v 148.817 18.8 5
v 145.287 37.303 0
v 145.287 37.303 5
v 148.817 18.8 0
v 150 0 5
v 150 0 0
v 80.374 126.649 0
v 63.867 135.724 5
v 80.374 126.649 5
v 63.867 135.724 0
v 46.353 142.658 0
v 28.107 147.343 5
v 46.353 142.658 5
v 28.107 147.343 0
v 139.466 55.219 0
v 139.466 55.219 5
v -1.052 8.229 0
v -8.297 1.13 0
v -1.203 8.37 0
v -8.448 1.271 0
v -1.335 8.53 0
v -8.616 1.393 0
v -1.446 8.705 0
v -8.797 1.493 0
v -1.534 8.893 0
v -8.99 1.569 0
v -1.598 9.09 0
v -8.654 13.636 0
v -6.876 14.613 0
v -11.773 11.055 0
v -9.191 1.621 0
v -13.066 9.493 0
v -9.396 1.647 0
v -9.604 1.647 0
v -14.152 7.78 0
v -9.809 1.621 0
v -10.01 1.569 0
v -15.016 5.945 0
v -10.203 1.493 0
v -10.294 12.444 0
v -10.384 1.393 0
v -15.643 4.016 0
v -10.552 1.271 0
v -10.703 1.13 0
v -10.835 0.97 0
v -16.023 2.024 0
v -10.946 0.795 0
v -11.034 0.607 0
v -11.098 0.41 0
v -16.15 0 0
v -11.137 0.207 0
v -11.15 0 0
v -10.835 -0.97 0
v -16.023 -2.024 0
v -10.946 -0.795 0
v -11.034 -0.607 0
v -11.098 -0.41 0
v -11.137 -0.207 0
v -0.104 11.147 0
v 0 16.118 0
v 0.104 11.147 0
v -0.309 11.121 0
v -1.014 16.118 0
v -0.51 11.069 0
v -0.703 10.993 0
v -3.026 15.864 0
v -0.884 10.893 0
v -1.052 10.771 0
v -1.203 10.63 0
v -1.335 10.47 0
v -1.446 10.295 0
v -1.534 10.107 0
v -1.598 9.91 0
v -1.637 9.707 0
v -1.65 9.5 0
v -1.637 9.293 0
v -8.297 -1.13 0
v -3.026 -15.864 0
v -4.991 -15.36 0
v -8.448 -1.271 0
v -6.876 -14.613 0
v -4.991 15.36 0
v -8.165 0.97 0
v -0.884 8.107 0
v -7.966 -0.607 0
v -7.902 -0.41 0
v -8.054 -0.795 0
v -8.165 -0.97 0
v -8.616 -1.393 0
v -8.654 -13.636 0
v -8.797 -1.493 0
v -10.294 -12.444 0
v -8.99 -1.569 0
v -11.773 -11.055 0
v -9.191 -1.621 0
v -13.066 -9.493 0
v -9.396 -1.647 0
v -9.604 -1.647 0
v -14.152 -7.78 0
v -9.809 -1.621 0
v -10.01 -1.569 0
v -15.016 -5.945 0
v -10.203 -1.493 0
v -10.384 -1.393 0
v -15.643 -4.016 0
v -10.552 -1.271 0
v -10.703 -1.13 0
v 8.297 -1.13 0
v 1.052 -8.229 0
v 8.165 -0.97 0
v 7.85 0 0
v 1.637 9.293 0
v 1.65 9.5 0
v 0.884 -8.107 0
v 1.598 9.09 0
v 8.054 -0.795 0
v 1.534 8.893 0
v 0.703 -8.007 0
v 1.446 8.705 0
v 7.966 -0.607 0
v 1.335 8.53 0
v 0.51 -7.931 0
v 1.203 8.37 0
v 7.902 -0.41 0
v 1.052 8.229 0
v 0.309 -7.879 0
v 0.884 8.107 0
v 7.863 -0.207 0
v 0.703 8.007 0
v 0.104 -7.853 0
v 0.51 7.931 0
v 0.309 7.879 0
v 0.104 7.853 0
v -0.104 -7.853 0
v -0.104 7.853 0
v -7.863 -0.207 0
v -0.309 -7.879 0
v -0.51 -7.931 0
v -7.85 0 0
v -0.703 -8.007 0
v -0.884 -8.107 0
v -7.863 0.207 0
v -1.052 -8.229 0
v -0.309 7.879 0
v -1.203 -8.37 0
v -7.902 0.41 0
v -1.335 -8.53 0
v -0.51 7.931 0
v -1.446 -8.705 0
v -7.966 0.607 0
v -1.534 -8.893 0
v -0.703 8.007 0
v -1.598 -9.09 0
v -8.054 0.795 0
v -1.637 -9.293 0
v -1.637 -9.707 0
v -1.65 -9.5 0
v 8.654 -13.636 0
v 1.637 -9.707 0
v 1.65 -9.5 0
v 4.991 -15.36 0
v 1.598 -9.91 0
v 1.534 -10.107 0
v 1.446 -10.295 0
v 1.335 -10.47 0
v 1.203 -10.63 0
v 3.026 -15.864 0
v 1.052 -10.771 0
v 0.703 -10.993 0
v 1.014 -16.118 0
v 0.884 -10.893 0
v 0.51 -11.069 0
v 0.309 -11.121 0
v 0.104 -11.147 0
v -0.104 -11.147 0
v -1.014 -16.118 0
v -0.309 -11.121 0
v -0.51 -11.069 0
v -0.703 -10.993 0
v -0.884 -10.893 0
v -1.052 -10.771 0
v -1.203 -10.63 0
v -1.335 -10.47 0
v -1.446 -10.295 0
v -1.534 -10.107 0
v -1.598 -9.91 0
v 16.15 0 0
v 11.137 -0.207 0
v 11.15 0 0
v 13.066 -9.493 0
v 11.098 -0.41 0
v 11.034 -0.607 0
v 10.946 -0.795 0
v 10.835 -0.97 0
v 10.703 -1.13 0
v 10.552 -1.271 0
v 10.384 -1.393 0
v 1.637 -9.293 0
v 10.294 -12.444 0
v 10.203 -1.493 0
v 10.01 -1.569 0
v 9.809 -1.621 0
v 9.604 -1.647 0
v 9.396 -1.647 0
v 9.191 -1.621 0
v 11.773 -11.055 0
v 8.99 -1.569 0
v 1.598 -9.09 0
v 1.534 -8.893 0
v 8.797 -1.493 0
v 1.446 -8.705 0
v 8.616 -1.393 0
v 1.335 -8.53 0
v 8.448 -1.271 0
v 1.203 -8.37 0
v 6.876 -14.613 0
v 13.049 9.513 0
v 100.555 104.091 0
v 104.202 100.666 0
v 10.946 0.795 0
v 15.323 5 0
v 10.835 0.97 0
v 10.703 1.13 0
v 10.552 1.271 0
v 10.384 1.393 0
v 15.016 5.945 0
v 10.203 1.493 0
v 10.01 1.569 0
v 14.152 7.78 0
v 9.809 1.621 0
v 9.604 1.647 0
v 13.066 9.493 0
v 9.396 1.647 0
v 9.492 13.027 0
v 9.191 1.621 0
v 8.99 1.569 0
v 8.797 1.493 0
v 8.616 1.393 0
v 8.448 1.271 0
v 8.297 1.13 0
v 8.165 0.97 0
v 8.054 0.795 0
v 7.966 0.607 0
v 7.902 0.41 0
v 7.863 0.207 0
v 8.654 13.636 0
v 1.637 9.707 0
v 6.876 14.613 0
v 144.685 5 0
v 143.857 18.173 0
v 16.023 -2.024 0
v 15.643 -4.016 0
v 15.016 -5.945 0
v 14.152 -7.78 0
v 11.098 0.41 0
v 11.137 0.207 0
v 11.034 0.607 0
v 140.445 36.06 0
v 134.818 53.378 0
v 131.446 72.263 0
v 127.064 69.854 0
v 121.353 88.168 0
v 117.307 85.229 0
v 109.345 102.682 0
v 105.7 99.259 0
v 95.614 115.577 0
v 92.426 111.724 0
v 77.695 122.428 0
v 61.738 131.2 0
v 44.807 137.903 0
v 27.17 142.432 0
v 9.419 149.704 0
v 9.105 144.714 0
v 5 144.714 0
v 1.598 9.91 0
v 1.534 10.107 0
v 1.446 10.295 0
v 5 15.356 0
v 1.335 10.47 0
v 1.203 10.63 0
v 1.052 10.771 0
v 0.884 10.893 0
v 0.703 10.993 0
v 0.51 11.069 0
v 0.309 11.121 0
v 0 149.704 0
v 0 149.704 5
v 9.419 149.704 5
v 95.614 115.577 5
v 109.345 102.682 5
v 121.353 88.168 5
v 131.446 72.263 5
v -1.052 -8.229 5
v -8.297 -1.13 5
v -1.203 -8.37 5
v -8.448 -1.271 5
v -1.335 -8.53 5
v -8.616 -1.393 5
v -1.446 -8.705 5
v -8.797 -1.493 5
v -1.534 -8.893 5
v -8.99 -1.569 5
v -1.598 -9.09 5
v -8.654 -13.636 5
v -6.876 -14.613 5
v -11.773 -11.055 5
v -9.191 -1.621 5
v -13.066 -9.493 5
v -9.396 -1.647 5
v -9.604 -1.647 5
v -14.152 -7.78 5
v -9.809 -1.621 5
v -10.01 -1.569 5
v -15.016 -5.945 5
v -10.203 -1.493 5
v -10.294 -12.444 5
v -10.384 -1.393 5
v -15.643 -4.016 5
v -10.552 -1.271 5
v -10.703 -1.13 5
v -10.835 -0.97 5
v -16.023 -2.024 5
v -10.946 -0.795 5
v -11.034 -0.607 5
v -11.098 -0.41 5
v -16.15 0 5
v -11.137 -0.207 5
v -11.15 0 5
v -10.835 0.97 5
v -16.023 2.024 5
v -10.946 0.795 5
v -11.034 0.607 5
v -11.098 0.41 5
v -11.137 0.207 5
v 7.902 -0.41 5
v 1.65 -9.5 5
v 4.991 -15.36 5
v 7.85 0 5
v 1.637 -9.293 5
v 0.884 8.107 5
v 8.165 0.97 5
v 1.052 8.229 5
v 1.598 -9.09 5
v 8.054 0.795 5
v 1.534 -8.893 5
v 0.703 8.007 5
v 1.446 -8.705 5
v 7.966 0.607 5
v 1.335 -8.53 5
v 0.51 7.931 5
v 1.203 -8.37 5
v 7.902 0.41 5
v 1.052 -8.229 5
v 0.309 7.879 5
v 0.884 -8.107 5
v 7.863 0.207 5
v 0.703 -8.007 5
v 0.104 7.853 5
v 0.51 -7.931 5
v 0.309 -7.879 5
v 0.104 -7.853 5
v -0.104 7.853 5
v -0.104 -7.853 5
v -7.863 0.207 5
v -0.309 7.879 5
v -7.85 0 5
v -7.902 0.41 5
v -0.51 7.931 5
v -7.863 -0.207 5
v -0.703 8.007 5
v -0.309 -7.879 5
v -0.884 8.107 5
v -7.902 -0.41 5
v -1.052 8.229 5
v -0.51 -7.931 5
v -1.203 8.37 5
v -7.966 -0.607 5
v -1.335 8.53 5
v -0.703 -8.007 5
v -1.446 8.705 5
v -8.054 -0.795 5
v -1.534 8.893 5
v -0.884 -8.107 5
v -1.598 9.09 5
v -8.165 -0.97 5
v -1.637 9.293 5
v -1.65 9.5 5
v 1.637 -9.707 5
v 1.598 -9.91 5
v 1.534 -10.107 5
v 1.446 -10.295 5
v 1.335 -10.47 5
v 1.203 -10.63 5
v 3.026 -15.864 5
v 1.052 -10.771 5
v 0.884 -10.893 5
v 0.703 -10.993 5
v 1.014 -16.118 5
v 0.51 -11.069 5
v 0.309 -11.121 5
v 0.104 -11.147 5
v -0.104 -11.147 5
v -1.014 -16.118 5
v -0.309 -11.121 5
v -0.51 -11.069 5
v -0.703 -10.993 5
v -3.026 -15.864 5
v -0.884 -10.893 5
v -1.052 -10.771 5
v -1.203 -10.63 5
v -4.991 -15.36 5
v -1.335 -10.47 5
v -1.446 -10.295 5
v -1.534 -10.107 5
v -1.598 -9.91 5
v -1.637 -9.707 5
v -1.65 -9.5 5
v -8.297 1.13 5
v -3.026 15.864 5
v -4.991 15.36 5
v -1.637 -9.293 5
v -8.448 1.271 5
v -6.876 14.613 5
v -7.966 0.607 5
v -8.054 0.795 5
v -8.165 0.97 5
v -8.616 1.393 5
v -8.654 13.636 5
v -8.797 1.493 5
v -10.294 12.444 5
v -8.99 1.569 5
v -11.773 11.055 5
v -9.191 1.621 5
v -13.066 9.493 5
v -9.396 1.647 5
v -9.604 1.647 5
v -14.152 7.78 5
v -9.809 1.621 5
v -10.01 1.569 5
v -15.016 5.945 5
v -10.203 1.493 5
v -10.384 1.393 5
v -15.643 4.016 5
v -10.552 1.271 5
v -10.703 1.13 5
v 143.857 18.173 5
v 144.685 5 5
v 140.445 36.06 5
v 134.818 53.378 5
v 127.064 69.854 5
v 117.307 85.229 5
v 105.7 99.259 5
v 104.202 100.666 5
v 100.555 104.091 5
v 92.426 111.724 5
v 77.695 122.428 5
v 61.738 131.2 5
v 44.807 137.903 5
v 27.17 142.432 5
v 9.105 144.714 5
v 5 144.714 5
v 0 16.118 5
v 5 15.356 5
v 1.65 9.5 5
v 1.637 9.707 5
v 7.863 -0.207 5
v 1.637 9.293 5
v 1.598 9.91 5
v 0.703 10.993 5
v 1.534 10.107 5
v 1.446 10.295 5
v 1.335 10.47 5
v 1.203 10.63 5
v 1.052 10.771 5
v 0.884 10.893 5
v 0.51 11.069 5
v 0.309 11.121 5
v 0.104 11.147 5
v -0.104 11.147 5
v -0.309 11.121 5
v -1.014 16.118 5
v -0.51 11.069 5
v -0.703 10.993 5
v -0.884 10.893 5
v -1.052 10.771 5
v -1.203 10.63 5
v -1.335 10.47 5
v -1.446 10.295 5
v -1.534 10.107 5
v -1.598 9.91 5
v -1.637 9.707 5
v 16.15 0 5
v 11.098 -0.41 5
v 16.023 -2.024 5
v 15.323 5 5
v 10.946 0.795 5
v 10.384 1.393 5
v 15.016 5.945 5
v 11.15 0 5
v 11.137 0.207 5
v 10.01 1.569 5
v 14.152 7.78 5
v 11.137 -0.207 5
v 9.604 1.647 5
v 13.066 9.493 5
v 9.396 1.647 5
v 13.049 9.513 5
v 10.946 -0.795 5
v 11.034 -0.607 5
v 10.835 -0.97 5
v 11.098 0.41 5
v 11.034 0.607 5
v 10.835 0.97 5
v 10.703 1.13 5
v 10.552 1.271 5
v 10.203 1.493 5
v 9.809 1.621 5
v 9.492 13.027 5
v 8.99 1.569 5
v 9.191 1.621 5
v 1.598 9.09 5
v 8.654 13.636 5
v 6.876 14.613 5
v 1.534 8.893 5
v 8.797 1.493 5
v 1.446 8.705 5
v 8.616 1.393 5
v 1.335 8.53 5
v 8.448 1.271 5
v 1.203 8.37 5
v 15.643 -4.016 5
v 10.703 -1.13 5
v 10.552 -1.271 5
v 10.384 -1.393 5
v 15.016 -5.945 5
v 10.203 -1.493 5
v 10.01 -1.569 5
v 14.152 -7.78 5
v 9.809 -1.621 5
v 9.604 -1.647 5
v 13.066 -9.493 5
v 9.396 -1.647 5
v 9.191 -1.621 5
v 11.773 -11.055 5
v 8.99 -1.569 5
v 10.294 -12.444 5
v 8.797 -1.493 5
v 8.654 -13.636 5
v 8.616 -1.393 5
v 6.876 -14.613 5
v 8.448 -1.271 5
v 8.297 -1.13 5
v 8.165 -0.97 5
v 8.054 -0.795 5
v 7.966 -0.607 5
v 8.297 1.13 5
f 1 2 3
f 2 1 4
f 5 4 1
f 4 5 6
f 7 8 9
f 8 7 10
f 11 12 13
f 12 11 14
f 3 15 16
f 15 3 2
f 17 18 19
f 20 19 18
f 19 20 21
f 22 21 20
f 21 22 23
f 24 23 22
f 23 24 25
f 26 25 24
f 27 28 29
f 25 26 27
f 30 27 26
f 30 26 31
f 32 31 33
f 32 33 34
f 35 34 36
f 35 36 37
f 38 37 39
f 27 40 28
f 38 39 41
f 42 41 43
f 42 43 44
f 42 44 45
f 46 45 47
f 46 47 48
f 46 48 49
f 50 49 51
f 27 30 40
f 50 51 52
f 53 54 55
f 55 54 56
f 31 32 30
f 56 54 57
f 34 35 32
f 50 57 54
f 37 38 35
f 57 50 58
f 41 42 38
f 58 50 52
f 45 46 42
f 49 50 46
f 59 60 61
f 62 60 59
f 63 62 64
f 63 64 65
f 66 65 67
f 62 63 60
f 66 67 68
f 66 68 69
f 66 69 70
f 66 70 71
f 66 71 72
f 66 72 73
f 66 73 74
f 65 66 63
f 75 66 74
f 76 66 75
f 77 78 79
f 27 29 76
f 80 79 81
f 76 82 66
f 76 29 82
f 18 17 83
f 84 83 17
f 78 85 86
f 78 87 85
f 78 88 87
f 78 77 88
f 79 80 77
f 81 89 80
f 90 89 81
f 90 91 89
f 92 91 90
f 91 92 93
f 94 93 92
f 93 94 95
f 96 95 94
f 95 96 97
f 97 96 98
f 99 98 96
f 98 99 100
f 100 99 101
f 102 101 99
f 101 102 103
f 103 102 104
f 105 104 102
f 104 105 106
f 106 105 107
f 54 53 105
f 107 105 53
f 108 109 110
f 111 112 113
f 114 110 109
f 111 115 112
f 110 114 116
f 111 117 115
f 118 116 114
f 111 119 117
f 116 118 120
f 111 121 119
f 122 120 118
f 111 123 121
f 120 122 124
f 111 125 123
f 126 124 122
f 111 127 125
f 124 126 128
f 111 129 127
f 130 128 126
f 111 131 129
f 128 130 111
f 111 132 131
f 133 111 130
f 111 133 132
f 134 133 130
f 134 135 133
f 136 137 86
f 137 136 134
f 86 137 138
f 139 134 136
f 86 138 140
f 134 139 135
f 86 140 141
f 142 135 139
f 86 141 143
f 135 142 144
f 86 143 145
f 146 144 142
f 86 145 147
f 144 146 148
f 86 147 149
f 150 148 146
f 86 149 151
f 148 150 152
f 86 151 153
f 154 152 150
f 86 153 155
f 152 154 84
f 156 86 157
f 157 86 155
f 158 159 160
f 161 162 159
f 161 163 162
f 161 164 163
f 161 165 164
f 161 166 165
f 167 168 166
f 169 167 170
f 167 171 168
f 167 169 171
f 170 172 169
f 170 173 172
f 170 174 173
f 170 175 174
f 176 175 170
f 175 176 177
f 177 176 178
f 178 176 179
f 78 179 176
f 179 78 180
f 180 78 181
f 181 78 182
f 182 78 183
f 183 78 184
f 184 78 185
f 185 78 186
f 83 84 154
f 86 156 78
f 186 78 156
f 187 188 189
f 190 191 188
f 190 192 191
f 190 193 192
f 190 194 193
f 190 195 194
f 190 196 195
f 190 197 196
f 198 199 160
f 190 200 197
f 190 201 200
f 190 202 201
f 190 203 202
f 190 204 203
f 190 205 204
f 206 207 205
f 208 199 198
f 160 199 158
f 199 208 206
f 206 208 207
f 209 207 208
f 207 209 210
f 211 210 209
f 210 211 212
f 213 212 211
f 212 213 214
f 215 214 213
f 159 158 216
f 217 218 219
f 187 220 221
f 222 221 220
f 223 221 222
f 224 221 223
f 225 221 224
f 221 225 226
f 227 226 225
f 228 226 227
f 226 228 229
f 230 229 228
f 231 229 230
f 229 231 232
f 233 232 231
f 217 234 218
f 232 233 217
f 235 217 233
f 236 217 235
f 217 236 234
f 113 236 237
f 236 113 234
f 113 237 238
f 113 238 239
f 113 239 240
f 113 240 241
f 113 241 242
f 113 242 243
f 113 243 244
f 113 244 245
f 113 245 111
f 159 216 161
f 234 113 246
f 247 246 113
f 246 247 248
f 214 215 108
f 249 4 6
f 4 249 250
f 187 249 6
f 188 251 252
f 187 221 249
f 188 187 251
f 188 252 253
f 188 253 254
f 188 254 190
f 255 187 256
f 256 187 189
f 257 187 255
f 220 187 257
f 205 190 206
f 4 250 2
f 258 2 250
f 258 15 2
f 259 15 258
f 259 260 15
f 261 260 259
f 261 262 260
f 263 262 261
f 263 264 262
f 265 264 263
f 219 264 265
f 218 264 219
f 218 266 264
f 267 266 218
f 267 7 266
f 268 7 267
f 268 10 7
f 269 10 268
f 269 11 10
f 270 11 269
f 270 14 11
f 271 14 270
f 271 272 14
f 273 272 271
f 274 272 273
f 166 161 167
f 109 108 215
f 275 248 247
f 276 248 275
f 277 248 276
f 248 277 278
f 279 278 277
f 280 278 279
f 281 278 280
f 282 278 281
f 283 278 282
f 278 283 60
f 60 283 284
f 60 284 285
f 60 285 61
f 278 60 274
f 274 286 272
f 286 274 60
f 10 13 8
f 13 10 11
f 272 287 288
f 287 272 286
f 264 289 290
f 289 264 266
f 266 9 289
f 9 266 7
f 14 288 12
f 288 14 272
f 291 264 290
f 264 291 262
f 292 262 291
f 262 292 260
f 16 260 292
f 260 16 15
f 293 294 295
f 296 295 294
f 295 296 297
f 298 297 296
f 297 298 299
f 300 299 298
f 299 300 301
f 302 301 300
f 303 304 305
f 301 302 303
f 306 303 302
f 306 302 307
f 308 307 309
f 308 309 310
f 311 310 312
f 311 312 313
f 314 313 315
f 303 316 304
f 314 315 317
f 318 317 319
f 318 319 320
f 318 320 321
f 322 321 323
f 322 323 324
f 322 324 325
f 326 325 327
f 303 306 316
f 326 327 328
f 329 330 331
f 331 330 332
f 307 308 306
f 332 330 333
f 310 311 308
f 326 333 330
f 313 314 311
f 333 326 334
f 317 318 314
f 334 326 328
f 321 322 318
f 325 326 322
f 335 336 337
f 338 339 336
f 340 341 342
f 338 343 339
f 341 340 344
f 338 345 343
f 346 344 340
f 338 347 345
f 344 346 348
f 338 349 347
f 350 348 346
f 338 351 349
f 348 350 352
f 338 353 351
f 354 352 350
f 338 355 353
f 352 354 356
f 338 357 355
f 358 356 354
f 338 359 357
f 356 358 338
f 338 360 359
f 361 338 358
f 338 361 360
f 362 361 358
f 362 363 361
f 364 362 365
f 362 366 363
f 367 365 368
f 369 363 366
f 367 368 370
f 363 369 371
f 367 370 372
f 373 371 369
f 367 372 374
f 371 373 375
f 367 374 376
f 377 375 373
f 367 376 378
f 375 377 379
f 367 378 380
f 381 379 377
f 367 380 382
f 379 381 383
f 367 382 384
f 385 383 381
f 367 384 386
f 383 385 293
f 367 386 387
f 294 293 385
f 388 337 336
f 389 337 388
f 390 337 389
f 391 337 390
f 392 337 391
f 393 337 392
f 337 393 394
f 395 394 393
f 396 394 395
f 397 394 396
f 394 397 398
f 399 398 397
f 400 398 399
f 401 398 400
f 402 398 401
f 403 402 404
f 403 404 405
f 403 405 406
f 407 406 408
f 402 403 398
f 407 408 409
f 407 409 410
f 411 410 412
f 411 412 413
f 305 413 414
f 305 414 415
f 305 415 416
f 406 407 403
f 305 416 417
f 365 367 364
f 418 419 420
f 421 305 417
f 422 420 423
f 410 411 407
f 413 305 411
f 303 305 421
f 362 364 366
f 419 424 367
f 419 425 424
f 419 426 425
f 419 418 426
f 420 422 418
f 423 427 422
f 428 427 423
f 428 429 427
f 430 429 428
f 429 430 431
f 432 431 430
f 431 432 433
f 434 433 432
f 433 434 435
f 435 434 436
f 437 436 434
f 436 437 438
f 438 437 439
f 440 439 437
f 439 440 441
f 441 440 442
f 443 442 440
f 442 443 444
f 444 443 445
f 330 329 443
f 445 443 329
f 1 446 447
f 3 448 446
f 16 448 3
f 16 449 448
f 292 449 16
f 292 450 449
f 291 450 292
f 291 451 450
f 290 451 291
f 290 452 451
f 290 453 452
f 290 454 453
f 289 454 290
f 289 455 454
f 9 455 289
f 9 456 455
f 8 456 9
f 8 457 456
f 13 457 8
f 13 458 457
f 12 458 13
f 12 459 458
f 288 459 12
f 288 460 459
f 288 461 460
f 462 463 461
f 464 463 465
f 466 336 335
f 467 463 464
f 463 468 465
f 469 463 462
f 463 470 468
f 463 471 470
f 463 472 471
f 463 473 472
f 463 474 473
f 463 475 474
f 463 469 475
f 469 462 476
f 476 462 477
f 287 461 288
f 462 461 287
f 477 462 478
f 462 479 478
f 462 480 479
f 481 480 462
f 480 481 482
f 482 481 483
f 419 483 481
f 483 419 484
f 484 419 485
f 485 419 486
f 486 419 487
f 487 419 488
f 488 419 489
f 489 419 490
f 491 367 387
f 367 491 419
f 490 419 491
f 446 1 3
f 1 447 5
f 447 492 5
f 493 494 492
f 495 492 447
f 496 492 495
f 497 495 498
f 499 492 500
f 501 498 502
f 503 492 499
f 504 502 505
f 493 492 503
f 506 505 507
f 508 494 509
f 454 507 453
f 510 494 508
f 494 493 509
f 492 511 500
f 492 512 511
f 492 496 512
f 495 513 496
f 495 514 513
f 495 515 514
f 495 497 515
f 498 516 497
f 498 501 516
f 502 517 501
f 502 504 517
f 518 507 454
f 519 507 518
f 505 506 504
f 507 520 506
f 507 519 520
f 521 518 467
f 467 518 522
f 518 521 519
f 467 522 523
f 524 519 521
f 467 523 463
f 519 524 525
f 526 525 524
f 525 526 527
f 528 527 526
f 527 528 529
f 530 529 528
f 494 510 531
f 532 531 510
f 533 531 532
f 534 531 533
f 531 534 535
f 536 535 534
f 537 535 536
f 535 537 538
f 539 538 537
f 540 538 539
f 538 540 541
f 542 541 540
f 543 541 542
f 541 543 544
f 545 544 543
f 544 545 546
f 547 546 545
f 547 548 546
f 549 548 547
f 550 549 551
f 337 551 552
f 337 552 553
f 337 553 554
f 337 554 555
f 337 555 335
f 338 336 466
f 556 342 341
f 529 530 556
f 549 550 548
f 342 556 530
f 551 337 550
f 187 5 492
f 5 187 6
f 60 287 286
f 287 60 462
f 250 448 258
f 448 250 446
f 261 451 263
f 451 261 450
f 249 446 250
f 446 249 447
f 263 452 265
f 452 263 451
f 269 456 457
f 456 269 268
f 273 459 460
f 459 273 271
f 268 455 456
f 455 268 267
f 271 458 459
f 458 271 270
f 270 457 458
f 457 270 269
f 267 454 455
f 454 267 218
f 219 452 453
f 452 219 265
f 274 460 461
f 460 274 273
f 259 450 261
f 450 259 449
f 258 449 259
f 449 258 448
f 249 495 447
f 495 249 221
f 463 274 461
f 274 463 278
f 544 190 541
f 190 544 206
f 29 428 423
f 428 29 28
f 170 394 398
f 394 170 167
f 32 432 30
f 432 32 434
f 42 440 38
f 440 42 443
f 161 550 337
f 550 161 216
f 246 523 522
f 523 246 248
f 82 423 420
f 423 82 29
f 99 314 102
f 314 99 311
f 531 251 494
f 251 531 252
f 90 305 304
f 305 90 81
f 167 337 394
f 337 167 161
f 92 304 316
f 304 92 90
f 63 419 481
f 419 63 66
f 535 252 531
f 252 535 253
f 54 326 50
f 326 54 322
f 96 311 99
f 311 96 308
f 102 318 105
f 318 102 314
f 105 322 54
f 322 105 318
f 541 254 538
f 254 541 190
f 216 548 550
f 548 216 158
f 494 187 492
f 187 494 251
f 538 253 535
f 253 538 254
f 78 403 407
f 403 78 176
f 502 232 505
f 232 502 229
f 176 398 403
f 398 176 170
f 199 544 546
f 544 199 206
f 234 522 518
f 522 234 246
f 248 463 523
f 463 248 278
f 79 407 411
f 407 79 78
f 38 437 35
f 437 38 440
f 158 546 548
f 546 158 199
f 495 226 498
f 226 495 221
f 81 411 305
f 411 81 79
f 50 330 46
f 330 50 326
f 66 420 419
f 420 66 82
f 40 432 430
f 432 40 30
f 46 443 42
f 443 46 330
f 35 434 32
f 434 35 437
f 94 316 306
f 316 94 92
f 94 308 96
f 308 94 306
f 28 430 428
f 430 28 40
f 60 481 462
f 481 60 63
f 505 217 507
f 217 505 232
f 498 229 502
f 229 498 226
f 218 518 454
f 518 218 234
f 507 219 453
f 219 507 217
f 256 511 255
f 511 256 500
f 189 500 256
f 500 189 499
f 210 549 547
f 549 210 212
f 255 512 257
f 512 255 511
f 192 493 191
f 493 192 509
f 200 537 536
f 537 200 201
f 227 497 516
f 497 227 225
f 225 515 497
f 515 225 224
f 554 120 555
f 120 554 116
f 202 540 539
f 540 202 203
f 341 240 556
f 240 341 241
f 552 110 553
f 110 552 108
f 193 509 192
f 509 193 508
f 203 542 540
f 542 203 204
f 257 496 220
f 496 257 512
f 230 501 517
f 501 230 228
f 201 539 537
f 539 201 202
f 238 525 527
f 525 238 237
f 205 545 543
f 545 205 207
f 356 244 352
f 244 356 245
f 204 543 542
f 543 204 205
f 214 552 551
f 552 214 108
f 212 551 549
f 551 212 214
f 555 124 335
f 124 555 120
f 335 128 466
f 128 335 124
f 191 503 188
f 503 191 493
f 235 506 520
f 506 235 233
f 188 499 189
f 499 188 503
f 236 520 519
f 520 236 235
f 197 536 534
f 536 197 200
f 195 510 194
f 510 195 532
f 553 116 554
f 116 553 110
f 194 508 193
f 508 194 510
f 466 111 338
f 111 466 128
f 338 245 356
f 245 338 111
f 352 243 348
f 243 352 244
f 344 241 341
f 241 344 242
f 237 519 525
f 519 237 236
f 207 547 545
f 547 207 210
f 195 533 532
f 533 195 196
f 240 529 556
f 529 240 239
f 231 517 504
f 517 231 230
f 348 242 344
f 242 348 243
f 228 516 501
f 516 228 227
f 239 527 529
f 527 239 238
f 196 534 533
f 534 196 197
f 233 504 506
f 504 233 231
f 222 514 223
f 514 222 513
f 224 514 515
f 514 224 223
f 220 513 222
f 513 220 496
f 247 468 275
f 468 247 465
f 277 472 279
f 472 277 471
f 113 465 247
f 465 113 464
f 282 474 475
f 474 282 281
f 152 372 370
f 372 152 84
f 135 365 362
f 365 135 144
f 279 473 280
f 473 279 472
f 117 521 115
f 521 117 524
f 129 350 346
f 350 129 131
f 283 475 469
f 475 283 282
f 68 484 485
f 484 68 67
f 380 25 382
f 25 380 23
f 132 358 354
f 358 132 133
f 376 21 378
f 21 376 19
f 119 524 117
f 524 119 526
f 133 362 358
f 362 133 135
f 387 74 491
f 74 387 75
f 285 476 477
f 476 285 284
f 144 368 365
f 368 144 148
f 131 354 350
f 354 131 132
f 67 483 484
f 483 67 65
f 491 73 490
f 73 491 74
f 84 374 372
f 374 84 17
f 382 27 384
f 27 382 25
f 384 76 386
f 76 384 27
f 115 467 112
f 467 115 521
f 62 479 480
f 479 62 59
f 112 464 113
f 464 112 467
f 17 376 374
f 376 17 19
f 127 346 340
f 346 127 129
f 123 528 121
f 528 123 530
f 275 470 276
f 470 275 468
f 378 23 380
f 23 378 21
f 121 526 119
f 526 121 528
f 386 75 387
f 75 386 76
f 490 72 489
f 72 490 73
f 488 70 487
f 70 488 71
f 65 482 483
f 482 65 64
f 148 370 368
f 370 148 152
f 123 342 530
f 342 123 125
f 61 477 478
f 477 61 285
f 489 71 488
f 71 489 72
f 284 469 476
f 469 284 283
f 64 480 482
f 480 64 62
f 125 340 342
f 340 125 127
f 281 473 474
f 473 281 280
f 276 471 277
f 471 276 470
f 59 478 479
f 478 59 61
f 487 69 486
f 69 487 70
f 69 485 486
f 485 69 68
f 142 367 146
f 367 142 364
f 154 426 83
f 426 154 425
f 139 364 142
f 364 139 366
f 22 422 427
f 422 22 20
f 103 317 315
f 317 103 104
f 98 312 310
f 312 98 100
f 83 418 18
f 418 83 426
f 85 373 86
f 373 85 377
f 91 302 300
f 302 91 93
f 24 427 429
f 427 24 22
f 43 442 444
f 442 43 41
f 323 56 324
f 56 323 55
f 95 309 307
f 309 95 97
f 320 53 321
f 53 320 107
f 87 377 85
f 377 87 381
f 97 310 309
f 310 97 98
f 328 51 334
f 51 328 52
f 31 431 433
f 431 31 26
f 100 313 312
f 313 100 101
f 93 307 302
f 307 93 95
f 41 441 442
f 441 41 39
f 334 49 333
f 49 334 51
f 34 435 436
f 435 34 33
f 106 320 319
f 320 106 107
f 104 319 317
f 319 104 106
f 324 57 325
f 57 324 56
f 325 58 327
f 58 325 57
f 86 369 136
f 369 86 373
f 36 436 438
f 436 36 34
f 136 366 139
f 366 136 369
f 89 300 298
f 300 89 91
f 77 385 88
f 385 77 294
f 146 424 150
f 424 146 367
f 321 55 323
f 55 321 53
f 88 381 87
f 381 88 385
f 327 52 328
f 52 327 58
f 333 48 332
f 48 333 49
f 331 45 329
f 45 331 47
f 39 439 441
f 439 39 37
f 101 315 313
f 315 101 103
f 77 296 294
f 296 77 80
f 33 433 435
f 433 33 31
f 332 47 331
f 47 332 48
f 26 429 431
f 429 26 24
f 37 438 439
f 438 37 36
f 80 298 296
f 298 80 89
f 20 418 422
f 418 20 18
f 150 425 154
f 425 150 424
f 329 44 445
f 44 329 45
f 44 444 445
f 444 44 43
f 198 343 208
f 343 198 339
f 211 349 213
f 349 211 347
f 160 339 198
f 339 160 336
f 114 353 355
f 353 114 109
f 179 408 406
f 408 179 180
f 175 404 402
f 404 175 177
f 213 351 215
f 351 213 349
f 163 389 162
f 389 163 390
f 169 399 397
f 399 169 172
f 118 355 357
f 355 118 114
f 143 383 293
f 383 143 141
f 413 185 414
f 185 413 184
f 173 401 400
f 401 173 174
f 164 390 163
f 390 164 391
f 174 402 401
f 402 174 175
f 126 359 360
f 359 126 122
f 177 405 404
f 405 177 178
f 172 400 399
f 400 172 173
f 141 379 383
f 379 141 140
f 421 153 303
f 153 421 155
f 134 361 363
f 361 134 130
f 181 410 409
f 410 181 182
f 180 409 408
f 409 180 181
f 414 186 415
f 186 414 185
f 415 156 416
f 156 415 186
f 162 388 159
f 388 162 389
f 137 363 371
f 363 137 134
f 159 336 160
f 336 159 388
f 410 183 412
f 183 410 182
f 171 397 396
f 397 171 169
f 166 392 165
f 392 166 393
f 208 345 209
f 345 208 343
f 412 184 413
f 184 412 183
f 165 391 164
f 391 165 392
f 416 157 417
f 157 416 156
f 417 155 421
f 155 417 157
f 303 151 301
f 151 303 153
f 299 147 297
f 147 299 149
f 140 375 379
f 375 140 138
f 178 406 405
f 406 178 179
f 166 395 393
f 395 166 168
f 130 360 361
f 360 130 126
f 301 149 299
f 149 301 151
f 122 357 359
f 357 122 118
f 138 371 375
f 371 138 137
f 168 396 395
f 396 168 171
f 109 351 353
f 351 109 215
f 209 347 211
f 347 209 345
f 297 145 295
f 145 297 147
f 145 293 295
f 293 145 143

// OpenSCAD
$fn = 50*1;

// Width of the beams
thickness = 5;

// z-Height of the part
height = 5;

// Radius of the outer circle
outer_radius = 150;

// Diameter of the holes for the screws
hole_diameter = 3.3;

// Diagonal distance between the holes
hole_distance = 19;

module outer_quarter_circle() {

	difference() {

		linear_extrude(height = height)
		circle(r = outer_radius);
		
		translate([-outer_radius/2,-outer_radius/2])
		linear_extrude(height = height)
		square([outer_radius,outer_radius], center = true);

		translate([outer_radius/2,-outer_radius/2])
		linear_extrude(height = height)
		square([outer_radius,outer_radius], center = true);

		translate([-outer_radius/2,outer_radius/2])
		linear_extrude(height = height)
		square([outer_radius,outer_radius], center = true);

	}

}

module inner_quarter_circle() {

	difference() {

		linear_extrude(height = height)
		circle(r = outer_radius-thickness);
		
		translate([-outer_radius/2,-outer_radius/2])
		linear_extrude(height = height)
		square([outer_radius+2*thickness,outer_radius+2*thickness], center = true);

		translate([outer_radius/2,-outer_radius/2])
		linear_extrude(height = height)
		square([outer_radius+2*thickness,outer_radius+2*thickness], center = true);

		translate([-outer_radius/2,outer_radius/2])
		linear_extrude(height = height)
		square([outer_radius+2*thickness,outer_radius+2*thickness], center = true);

	}

}

module Hole(diameter, depth, placement=[0, 0, 0]) {

	placement_offset=depth < 0? [0, 0, depth] : [0, 0, 0];
	translate(placement+placement_offset)
	linear_extrude(height=abs(depth))
	circle(r=diameter/2);

}

difference() {

	union() {
	
		difference() {
			outer_quarter_circle();
			inner_quarter_circle();
		}
	
		linear_extrude(height = height)
		circle(r = hole_distance/2+hole_diameter/2+thickness);
		
		rotate([0,0,-45]) {
		translate([0,outer_radius/2,0])
		linear_extrude(height = height)
		square([thickness,outer_radius-thickness/2], center = true);
		}
	
	}

	Hole(hole_diameter, height, [hole_distance/2, 0, 0]);

	Hole(hole_diameter, height, [0, hole_distance/2, 0]);

	Hole(hole_diameter, height, [-hole_distance/2, 0, 0]);

	Hole(hole_diameter, height, [0, -hole_distance/2, 0]);

}
